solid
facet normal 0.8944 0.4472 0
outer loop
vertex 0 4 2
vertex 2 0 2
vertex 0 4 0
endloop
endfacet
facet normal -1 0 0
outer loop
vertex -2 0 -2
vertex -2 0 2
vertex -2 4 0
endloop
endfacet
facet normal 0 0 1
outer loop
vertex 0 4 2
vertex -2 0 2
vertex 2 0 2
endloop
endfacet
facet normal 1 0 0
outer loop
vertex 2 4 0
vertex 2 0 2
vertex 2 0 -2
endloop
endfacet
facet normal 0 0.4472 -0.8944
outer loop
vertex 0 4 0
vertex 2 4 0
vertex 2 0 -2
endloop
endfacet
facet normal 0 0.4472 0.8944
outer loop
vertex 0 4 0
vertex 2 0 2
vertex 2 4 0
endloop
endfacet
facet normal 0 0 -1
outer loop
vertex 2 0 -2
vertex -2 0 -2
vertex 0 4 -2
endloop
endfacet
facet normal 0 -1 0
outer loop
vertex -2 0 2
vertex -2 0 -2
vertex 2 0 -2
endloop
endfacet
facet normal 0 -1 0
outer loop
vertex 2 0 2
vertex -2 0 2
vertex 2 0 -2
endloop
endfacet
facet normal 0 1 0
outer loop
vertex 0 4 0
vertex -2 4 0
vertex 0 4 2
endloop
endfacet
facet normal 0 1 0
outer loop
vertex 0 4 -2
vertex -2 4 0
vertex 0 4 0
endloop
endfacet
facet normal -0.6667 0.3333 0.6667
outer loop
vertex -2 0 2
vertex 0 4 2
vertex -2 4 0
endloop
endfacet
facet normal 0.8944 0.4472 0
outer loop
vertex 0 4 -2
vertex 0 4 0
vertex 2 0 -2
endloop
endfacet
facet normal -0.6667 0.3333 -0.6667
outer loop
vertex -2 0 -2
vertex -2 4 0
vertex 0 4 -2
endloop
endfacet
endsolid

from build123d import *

# Parameters (mm, degrees)
SKETCH2_W           = 4
SKETCH2_H           = 4
BOSS_EXTRUDE1_DEPTH = 4
CUT_EXTRUDE4_START  = -0.894427191
CUT_EXTRUDE4_DEPTH  = 4.472135955
CUT_EXTRUDE9_DEPTH  = 10
CUT_EXTRUDE10_DEPTH = 10


# Read off the part's stored shape, not the designer's step: Cut-Extrude4
with BuildPart() as part:
    # Sketch2 → Boss-Extrude1 (new body)
    with BuildSketch(Plane(origin=(0, 0, 0), x_dir=(1, 0, 0), z_dir=(0, 1, 0))):
        Rectangle(SKETCH2_W, SKETCH2_H)
    extrude(amount=BOSS_EXTRUDE1_DEPTH)

    # Cut-Extrude4 outline → Cut-Extrude4 (cut)
    with BuildSketch(Plane(origin=(0, 0, 0), x_dir=(0.8944271909999155, -0.4472135954999585, 0), z_dir=(0.4472135954999585, 0.8944271909999156, 0)).offset(CUT_EXTRUDE4_START)):
        Polygon((-1.788854382, -2), (-3.577708764, 0), (-1.788854382, 2), (-5, 2), (-5, -2), align=None)
    extrude(amount=CUT_EXTRUDE4_DEPTH, mode=Mode.SUBTRACT)

    # 3DSketch4 → Cut-Extrude9 (cut, along a direction that is not the sketch's normal)
    with BuildSketch(Plane(origin=(2, 0, 2), x_dir=(-0.4082482904638631, 0.8164965809277261, -0.4082482904638631), z_dir=(0, -0.447213595499958, -0.894427190999916))):
        Polygon((0, 0), (4.898979486, 0), (4.082482905, 1.825741858), align=None)
    extrude(amount=-CUT_EXTRUDE9_DEPTH, dir=(0, 0, -1), mode=Mode.SUBTRACT)

    # 3DSketch5 → Cut-Extrude10 (cut, along a direction that is not the sketch's normal)
    with BuildSketch(Plane(origin=(0, 4, 0), x_dir=(0.4082482904638631, -0.8164965809277261, -0.4082482904638631), z_dir=(0, -0.447213595499958, 0.8944271909999159))):
        Polygon((0, 0), (4.898979486, 0), (0.816496581, 1.825741858), align=None)
    extrude(amount=-CUT_EXTRUDE10_DEPTH, dir=(0, 0, 1), mode=Mode.SUBTRACT)


solid = part.part
